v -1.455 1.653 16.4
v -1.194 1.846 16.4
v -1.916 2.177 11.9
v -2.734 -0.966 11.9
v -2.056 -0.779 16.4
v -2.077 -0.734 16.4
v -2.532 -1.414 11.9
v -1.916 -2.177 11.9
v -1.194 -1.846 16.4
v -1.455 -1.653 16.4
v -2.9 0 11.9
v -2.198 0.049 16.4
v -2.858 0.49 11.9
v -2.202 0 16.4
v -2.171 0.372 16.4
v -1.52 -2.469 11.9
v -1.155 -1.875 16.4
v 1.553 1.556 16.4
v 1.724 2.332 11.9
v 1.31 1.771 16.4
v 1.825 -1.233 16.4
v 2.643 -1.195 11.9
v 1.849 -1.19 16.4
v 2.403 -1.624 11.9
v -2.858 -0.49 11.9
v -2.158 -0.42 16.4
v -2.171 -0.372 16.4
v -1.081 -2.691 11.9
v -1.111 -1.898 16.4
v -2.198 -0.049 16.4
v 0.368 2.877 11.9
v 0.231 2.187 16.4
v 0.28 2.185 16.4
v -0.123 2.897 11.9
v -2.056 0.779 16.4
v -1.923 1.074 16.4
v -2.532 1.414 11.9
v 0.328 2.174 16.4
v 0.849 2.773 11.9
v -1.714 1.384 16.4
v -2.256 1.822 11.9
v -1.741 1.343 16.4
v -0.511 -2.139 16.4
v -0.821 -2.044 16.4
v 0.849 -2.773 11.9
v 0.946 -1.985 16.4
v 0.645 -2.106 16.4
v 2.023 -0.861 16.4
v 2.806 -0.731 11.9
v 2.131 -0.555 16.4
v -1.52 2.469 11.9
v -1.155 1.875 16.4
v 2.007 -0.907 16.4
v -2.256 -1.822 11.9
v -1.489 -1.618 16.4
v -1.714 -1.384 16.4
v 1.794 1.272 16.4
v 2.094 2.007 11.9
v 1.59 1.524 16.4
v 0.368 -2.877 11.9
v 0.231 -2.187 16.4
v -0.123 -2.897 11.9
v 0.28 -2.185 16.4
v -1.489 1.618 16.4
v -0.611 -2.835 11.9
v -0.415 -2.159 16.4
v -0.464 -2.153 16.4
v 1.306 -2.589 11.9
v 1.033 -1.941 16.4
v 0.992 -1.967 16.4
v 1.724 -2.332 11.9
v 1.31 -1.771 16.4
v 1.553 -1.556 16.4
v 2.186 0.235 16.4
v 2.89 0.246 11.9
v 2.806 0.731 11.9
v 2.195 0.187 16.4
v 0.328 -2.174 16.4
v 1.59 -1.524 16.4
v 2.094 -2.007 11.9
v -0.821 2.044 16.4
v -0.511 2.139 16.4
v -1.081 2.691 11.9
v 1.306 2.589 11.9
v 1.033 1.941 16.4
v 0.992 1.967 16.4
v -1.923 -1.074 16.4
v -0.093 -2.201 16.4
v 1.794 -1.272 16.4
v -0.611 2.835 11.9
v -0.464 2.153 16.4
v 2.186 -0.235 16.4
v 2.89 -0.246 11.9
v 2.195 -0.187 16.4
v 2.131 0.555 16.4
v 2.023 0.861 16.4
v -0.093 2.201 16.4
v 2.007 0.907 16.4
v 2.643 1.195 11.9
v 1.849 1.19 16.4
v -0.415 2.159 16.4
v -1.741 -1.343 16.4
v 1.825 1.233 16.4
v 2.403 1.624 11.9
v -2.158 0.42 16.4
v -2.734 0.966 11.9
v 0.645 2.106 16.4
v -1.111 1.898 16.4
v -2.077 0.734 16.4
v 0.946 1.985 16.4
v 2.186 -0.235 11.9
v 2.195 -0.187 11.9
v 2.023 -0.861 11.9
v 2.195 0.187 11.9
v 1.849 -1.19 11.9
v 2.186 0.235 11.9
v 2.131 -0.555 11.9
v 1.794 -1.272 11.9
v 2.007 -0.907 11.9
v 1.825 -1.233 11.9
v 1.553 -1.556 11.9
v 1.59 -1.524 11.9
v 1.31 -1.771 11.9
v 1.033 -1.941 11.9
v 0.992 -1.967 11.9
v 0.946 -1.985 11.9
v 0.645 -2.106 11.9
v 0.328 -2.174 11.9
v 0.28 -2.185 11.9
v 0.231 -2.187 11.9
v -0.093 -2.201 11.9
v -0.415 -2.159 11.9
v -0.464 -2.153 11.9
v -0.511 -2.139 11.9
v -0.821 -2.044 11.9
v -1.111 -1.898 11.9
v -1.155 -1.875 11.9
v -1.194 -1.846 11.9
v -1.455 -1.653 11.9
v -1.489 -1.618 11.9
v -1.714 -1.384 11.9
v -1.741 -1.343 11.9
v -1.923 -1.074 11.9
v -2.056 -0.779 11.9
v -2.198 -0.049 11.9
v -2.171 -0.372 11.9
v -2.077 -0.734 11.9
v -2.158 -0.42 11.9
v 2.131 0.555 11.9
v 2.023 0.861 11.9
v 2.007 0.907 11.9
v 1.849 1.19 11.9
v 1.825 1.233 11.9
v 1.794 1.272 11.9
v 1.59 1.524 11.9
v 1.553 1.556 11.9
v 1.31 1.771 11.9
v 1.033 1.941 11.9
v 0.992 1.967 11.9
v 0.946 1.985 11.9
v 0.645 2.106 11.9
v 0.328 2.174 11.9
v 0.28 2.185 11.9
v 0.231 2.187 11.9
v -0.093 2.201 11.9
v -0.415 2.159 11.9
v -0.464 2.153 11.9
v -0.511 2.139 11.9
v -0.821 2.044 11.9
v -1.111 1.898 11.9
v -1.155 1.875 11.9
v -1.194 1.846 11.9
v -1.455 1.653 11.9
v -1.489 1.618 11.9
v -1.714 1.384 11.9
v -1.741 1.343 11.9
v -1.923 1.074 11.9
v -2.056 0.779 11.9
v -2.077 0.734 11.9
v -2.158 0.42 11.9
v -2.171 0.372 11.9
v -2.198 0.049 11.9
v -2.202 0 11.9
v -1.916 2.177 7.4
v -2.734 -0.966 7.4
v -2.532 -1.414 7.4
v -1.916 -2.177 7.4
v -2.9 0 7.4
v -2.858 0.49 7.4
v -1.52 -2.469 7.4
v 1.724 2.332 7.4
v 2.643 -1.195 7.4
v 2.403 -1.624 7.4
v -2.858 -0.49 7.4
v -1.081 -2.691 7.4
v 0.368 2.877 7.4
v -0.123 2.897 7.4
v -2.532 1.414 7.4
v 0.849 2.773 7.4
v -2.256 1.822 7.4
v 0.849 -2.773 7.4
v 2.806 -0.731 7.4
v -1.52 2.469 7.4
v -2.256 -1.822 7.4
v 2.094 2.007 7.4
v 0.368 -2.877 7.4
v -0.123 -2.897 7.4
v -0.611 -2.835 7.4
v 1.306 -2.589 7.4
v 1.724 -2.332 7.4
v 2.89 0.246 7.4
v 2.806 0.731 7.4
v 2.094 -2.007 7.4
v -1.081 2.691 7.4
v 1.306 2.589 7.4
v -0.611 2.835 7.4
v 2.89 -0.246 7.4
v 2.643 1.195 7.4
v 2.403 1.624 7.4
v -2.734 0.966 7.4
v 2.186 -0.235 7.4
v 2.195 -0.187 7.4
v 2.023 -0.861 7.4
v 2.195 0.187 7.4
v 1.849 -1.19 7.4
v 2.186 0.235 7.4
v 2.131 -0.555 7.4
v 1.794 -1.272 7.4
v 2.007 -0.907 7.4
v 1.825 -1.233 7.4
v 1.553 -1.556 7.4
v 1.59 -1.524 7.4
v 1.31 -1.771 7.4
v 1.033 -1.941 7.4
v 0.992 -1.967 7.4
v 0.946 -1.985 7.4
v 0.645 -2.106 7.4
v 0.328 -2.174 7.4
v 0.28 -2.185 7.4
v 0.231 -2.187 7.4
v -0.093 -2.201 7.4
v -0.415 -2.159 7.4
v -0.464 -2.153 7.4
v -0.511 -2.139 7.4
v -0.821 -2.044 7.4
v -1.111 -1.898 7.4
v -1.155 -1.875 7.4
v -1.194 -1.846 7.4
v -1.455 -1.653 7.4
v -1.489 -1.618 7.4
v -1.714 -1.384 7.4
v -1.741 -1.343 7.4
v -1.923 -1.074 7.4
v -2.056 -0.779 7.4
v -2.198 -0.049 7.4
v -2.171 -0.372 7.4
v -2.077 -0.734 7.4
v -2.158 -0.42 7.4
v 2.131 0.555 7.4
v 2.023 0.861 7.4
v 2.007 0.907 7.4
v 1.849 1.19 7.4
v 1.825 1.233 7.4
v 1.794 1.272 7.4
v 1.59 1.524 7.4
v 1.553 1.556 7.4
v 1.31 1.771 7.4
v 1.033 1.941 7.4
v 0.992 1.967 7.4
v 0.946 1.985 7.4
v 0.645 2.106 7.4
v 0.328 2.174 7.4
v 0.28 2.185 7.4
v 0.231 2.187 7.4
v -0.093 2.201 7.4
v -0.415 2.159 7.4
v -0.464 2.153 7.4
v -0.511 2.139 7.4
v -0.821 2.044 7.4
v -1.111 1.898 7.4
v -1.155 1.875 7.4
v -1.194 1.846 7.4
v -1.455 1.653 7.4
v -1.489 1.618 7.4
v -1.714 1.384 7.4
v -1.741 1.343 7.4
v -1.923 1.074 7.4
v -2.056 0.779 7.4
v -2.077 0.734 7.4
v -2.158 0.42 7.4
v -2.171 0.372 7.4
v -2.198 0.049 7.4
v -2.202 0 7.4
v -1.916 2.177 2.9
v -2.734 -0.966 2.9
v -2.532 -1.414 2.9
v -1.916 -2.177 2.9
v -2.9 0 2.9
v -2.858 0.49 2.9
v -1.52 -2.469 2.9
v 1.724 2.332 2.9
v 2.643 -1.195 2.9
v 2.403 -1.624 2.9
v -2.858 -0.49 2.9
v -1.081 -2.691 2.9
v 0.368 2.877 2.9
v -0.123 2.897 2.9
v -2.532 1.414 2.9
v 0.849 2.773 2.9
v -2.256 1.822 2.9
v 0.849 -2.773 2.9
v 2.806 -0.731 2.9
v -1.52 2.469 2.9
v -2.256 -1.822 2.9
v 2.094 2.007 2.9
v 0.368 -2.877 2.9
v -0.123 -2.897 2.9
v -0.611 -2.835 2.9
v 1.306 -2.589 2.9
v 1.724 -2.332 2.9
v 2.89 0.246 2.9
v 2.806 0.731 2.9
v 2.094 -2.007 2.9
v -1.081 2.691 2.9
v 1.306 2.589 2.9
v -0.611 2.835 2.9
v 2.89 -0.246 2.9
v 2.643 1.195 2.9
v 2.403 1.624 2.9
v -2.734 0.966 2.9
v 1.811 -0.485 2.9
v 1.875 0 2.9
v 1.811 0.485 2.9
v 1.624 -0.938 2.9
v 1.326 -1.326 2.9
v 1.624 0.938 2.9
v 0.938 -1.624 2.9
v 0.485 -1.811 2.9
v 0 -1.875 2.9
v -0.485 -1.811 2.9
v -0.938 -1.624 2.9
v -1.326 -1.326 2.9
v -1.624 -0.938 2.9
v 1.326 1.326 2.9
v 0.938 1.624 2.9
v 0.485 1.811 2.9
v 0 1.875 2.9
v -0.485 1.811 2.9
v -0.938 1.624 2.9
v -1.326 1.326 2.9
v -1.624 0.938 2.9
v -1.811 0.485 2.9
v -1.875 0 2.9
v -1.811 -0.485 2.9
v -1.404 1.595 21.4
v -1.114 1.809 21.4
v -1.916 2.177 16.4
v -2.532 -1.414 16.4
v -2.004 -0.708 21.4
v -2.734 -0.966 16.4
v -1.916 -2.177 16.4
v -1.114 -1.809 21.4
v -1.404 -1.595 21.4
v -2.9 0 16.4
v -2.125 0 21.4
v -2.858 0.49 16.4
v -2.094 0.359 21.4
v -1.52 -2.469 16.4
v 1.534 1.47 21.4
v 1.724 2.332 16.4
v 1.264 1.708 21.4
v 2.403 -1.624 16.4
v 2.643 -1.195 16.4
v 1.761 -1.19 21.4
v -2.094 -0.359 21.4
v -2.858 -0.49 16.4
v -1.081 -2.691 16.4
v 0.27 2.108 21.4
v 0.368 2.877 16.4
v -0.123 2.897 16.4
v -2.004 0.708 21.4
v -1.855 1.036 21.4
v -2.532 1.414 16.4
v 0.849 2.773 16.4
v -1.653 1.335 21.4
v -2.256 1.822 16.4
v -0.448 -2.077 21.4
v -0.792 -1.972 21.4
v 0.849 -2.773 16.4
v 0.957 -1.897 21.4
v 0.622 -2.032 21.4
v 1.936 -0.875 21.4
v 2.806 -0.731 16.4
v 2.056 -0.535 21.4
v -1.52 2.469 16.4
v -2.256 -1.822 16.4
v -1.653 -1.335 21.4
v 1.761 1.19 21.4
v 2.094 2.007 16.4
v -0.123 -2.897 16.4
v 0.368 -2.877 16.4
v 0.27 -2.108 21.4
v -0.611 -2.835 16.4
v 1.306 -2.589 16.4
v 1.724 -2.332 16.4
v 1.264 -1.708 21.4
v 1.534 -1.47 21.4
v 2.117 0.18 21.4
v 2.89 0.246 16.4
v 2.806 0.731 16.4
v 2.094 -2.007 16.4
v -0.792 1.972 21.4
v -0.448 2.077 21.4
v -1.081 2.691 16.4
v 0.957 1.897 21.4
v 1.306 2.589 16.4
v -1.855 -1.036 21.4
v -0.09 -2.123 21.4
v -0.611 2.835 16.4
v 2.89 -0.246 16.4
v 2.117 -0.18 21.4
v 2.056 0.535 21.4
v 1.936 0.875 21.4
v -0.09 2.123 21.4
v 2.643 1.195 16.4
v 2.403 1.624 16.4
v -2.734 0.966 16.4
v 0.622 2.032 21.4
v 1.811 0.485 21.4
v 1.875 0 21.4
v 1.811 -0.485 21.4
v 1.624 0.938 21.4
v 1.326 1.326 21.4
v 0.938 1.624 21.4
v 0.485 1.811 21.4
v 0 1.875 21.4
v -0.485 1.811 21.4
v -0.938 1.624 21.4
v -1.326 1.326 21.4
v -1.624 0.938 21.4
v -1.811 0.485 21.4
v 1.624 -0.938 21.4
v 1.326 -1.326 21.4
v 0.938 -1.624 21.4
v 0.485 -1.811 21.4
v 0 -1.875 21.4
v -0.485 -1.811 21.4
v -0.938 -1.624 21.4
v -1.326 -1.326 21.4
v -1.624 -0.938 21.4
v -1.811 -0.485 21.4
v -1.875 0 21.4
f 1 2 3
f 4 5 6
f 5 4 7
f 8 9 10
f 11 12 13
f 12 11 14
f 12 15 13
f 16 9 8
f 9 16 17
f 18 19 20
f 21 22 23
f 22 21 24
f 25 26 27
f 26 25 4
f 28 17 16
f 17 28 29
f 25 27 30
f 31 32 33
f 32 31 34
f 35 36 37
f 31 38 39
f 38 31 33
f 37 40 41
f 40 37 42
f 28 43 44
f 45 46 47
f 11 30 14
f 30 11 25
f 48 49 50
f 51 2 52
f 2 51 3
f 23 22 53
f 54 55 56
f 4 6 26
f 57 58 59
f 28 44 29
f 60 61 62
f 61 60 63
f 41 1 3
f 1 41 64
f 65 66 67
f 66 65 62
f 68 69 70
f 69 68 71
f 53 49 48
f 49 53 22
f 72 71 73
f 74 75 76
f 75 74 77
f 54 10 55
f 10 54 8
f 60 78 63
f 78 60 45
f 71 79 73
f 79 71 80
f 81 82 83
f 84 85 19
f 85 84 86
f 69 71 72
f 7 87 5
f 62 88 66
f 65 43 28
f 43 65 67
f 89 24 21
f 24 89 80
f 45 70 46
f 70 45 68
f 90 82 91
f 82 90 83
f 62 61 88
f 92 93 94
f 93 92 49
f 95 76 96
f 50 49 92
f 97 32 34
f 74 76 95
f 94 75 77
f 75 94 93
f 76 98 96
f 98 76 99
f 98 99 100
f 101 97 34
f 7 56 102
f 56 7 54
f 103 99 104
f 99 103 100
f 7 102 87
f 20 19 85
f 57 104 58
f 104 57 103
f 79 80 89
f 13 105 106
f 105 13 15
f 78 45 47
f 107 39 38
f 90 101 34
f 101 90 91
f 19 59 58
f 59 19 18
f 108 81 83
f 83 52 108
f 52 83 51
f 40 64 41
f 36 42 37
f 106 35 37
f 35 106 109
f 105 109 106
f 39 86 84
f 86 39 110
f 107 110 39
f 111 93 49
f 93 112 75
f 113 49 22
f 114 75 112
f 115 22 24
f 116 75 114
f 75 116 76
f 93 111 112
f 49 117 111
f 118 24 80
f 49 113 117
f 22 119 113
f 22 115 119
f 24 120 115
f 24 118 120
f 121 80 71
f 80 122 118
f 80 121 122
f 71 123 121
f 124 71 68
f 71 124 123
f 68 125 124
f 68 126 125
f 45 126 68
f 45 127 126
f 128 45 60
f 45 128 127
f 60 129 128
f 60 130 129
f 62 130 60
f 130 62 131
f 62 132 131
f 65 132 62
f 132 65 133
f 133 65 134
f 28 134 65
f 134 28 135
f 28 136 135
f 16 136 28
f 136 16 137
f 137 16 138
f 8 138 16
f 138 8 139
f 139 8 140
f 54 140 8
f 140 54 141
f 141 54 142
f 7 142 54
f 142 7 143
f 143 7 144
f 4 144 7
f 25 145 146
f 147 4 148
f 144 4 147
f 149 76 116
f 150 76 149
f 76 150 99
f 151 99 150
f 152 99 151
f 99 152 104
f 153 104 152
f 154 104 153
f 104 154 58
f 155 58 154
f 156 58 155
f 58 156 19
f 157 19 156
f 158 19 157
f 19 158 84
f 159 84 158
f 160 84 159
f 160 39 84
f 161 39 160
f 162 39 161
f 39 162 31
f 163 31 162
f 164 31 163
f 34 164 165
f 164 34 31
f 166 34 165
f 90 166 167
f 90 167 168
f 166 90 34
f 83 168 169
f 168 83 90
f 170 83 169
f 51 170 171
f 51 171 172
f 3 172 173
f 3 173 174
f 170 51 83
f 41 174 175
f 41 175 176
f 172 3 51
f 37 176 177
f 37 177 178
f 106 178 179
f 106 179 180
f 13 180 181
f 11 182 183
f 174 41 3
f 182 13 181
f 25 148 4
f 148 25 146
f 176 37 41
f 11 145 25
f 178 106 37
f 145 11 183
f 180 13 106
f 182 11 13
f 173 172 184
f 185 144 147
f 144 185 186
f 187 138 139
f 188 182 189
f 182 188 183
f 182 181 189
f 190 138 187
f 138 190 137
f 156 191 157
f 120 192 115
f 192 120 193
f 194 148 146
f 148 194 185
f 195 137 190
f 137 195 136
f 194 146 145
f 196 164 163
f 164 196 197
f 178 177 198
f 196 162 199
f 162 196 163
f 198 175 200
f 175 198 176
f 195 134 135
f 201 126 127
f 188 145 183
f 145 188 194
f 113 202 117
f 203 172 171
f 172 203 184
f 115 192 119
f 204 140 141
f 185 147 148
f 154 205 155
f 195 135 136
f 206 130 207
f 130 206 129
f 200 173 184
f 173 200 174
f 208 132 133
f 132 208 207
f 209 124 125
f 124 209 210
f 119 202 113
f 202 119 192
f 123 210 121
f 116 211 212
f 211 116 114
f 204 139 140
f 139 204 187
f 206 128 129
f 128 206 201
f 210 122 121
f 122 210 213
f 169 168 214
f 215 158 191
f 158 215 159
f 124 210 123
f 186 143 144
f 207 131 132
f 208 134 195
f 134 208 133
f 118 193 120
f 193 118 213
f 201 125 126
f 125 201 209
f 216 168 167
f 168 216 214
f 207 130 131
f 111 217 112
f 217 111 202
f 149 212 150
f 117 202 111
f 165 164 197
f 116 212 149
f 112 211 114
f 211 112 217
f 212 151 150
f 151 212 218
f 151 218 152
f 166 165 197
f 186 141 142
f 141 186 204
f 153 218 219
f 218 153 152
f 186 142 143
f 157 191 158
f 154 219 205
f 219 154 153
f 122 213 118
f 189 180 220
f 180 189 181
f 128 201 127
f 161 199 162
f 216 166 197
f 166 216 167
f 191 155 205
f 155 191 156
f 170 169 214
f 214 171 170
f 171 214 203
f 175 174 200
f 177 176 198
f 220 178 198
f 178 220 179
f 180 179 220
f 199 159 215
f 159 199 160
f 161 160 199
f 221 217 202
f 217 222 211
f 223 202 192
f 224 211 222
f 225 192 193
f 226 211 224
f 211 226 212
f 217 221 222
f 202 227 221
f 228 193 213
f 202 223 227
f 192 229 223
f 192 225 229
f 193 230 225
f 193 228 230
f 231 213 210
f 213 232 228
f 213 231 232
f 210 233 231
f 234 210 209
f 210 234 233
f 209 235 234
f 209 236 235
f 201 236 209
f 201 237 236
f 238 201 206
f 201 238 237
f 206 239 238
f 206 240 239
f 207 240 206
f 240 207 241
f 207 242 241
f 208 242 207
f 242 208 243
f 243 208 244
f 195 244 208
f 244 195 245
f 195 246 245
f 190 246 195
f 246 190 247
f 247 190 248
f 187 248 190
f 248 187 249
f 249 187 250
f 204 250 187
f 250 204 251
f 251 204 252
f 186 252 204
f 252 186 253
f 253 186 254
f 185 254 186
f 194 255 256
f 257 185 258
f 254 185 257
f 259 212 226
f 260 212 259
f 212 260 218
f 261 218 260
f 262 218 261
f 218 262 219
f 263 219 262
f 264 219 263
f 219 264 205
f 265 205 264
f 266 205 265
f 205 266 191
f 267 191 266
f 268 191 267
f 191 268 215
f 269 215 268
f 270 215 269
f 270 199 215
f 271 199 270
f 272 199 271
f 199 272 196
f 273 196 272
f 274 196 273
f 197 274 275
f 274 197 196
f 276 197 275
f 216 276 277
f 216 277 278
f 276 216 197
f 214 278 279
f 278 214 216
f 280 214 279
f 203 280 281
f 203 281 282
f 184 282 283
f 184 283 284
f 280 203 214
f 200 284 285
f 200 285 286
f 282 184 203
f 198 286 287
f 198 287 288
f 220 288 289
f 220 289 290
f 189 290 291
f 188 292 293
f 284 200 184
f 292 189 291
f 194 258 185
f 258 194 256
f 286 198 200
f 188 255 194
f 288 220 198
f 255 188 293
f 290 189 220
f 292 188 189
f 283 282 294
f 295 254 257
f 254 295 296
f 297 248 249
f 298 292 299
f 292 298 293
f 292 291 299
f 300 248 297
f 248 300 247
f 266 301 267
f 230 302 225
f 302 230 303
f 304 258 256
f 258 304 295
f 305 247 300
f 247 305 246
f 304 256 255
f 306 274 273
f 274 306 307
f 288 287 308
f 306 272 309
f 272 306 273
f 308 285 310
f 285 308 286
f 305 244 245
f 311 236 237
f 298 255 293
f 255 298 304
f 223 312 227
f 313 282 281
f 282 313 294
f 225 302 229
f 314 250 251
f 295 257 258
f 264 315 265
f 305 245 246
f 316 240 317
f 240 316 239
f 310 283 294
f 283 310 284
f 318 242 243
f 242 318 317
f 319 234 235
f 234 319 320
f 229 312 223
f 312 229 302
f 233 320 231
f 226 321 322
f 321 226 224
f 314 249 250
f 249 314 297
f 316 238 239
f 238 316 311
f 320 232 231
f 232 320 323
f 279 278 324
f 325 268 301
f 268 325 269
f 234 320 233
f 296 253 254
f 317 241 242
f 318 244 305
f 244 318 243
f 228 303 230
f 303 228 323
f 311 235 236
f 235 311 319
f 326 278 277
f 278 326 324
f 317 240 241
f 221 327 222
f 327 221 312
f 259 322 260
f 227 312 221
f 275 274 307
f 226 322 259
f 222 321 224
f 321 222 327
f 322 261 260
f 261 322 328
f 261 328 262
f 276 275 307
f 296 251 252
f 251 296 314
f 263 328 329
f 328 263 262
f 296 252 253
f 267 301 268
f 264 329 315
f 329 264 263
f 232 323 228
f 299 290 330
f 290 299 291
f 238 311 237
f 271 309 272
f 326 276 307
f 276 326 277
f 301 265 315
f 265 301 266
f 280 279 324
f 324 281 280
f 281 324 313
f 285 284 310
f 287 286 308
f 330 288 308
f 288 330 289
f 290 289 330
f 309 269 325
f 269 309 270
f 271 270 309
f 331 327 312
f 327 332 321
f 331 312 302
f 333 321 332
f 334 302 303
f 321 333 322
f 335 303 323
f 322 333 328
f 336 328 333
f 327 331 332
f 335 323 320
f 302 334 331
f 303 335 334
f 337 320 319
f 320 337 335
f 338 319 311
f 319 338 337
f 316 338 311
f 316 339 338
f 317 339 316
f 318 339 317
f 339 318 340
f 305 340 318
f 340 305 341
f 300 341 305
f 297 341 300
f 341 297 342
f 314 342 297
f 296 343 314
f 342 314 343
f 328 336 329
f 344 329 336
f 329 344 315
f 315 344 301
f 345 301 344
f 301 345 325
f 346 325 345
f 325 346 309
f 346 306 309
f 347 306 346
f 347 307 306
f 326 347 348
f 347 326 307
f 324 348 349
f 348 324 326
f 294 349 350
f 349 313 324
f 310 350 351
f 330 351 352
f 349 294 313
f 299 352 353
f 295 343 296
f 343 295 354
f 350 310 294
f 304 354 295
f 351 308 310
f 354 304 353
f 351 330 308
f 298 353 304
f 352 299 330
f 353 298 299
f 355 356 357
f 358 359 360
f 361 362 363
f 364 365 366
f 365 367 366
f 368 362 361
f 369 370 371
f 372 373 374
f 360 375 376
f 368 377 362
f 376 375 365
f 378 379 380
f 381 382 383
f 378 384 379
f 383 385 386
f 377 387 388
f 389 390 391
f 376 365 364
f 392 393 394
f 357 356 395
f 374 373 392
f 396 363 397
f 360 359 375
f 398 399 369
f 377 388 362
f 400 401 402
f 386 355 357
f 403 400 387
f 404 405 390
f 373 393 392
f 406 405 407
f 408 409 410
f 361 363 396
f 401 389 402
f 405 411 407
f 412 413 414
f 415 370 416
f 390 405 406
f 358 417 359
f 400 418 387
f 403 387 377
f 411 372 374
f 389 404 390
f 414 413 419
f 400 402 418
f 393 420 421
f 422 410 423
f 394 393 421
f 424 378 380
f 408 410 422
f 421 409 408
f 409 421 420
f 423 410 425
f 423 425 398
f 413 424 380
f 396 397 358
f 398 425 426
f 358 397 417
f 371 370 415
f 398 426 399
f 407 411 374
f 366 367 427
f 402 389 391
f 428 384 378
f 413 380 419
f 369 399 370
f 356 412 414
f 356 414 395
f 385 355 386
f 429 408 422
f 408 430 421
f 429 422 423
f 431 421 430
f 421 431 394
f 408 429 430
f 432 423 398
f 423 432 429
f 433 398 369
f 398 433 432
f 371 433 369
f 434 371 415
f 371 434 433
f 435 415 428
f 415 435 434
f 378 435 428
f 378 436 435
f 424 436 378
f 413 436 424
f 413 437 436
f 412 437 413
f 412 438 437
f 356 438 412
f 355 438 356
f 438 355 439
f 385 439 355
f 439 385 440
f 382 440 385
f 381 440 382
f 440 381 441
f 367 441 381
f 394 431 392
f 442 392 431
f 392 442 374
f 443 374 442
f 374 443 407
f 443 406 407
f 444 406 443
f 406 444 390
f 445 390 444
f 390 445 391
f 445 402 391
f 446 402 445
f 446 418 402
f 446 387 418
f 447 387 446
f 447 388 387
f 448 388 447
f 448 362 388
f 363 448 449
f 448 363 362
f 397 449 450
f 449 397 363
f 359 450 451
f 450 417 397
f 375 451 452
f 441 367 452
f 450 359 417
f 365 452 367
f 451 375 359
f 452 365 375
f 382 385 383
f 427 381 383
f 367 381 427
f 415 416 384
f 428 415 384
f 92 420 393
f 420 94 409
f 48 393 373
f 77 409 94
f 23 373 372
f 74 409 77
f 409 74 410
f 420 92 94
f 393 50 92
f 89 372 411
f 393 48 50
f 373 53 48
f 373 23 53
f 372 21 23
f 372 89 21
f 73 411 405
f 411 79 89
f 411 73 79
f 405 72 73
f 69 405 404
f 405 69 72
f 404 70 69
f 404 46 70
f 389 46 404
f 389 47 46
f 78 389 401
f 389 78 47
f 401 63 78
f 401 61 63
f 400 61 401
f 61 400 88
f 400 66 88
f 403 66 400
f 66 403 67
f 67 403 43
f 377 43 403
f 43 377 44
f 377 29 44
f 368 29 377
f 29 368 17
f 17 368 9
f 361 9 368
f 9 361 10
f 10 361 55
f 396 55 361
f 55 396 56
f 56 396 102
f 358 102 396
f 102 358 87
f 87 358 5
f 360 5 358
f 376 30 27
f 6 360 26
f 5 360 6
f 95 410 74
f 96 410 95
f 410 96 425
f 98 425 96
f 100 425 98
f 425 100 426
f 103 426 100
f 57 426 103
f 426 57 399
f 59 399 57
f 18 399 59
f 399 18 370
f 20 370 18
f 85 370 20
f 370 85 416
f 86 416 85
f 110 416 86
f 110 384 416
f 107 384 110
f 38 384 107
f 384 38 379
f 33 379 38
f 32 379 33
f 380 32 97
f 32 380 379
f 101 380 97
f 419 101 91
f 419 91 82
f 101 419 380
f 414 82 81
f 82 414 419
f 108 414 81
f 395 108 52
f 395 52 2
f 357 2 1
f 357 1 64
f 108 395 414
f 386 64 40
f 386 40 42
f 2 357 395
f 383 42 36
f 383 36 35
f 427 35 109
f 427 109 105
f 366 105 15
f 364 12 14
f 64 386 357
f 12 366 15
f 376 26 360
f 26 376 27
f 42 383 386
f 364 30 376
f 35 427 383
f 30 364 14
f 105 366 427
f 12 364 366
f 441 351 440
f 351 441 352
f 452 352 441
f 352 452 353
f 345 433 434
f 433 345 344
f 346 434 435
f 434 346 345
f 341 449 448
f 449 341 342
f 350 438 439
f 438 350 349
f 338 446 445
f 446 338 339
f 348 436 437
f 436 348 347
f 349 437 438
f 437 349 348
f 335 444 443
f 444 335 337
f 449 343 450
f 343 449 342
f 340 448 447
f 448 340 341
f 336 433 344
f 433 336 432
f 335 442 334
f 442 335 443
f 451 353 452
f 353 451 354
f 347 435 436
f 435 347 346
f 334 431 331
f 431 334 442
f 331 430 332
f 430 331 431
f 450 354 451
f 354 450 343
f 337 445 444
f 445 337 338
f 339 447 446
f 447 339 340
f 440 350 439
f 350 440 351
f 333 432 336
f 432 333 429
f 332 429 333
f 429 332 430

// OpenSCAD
// Number of hose inputs - which is input and which is output doesn't matter but the input will be on the bottom of the print so should be the larger of the two
inputs = 1;
// Number of hose outputs
outputs = 1;
//  Measurement system for inputs - US in inches, Metric in mm
input_units = "US"; // [US,Metric]
// Measurement system for outputs
output_units = "US"; // [US,Metric]
// Input tubing inside diameter, e.g. 0.5 for 1/2 inch (US); 0.625 for 5/8, 0.75 for 3/4, etc
input_size = 0.625;
// Output tubing inside diameter, e.g. 0.17 for 1/4 inch OD (outside diameter) vinyl tubing (US); 0.25 for 1/4 inch ID (inside diameter) (US); 0.375 for 3/8 inch ID
output_size = 0.375;
// Connector type - Use inline for a single input and single output
connector_type = "inline"; // [inline,vault]
// Inline junction type - currently only round is supported
inline_junction_type = "round"; // [round,hex,none]


/* [Manifold] */

// Vault wall thickness in mm - increase for higher pressure connections
vault_wall_thickness = 2.0;
// Add support under vault for printing
vault_support = "yes"; // [yes,no]
// Ratio of connector diameter to space allocated in vault - increase to allow more space for hose clamps, etc.
vault_connector_ratio = 1.8;

/* [Advanced] */

// Width of junction as ratio of tubing I.D.
inline_junction_width = 0.8;
// Strength factor - use more than 1 for thicker walls to handle higher pressure and stronger clamping
strength = 1.0;
// Number of barbs on input - use 3 for larger tubing to reduce overall print height
input_barb_count = 3;
// Number of barbs on output - use 4 for smaller tubing
output_barb_count = 4;

/* [Hidden] */
inches_to_mm = 25.400;

//make_adapter( input_units == "US" ? input_size * inches_to_mm : input_size, output_units == "US" ? output_size * inches_to_mm : output_size );

module make_adapter( input_diameter, output_diameter )
{

if (connector_type == "inline" && inputs == 1 && outputs == 1)
{
  assign ( junction_height = input_barb_count )
  {
    union() {
      input_barb( input_diameter );
      junction( input_diameter, output_diameter, junction_height );
      output_barb( input_diameter, output_diameter, junction_height );
    }
  }
}
if (connector_type == "vault" || inputs > 1 || outputs > 1)
{
  assign( center_width = max(inputs * input_diameter * vault_connector_ratio, outputs * output_diameter * vault_connector_ratio), center_height = max(input_diameter * vault_connector_ratio, output_diameter * vault_connector_ratio), junction_height = input_barb_count )
  {
   assign( center_empty_input = center_width - input_diameter * vault_connector_ratio * inputs, center_empty_output = center_width - output_diameter * vault_connector_ratio * outputs )
   {
     union() {
       //input_barb( input_diameter );
       for (i = [1:inputs]) 
	    {
		   translate( [center_empty_input / 2 + input_diameter * vault_connector_ratio / 2 + input_diameter * (i-1) * vault_connector_ratio,0,0] ) input_barb( input_diameter );
	    }
		 //echo( "inputs=", inputs, "; input_diameter=", input_diameter, "; outputs=", outputs, "; output_diameter=", output_diameter );
		 //echo( "center_width=", center_width, "; by input=", inputs * input_diameter * vault_connector_ratio, "; by output=", outputs * output_diameter * vault_connector_ratio, "; center_empty_input=", center_empty_input, "; center_empty_output=", center_empty_output );
		 difference()
		 {
			translate([-vault_wall_thickness,-vault_wall_thickness,0]) vault( input_diameter, junction_height, center_width, center_height, center_height, vault_wall_thickness );
			for (i = [1:inputs]) 
			{
				// Make holes in the vault for input entry
      		translate( [center_empty_input / 2 + input_diameter * vault_connector_ratio / 2 + input_diameter * (i-1) * vault_connector_ratio,0,input_diameter * input_barb_count * 0.9 - center_height / 3] ) cylinder( r=input_diameter * 0.36, h=center_height );
			}
			for (i = [1:outputs]) 
			{
				// Make holes in the vault for output egress
      		translate( [center_empty_output / 2 + output_diameter * vault_connector_ratio / 2 + output_diameter * (i-1) * vault_connector_ratio,0,input_diameter * input_barb_count * 0.9 + center_height / 2] ) cylinder( r=output_diameter * 0.36, h=center_height );
			}
		 } // end vault with holes
       //output_barb( input_diameter, output_diameter, 12 );
	    for (i = [1:outputs]) 
		 {
			translate( [center_empty_output / 2 + output_diameter * vault_connector_ratio / 2 + output_diameter * (i-1) * vault_connector_ratio,0,-output_diameter * 0.3] ) output_barb( input_diameter, output_diameter, center_height + 2 * vault_wall_thickness );
		 }
     }
	}
  }
}
}

/****
module tometric( unit_type, value )
{
  if (unit_type == "US") value * 25.4;
  else value;
}
***/

module barbnotch( inside_diameter )
{
  // Generate a single barb notch
  cylinder( h = inside_diameter * 1.0, r1 = inside_diameter * 0.85 / 2, r2 = inside_diameter * 1.16 / 2, $fa = 0.5, $fs = 0.5 );
}

module solidbarbstack( inside_diameter, count )
{
    union() {
      barbnotch( inside_diameter );
		for (i=[2:count]) 
		{
			translate([0,0,(i-1) * inside_diameter * 0.9])
            barbnotch( inside_diameter );
		}
		/***
		if (count > 1) translate([0,0,1 * inside_diameter * 0.9]) barbnotch( inside_diameter );
		if (count > 2) translate([0,0,2 * inside_diameter * 0.9]) barbnotch( inside_diameter );
		***/
    }
}

module barb( inside_diameter, count )
{
  // Generate 4 barbs
  difference() {
    solidbarbstack( inside_diameter, count );
    translate([0,0,-0.3]) cylinder( h = inside_diameter * (count + 1), r = inside_diameter * 0.75 / 2, $fa = 0.5, $fs = 0.5 );
  }
}

module input_barb( input_diameter )
{
  barb( input_diameter, input_barb_count );
}

module output_barb( input_diameter, output_diameter, jheight )
{
  translate( [0,0,input_diameter * input_barb_count * 0.9 + output_diameter * output_barb_count * 0.9 + jheight + 1] ) rotate([0,180,0]) barb( output_diameter, output_barb_count );
}

module junction( input_diameter, output_diameter, jheight )
{
    holeD=input_diameter >= output_diameter ? output_diameter : input_diameter;
  junction_diameter_ratio = (inline_junction_type == "none") ? 1.1 : 1.6;
  translate( [0,0,input_diameter * jheight * 0.9] ) difference() {
	cylinder( r = max(input_diameter, output_diameter) * junction_diameter_ratio / 2, h = 5, $fa = 0.5, $fs = 0.5 );
	cylinder( r1 = input_diameter / 2, r2 = output_diameter / 2, h = (jheight + 1), $fa = 0.5, $fs = 0.5 );
    cylinder(r=holeD/2, h=jheight*2, center=false);
  }
}

module vault( input_diameter, jheight, center_width, center_depth, center_vheight, wall_thickness )
{
  assign( outside_width = center_width + 2 * wall_thickness, outside_depth = center_depth + 2 * wall_thickness, outside_vheight = center_vheight + 2 * wall_thickness, vault_base = input_diameter * jheight * 0.9 )
  {
    translate( [0, -outside_depth / 2 + wall_thickness, vault_base - wall_thickness] ) union()
	 {
	   difference() 
      {
        cube( [outside_width,outside_depth,outside_vheight] );
        translate( [wall_thickness,wall_thickness,wall_thickness] ) cube( [center_width, center_depth, center_vheight] );
      }
	   // Add supports if requested
		if (vault_support == "yes")
	   {
		  assign( support_leg_width = center_width / 4, support_leg_thickness = wall_thickness / 2 )
		  {
		  translate([outside_width-support_leg_width,outside_depth-support_leg_thickness,wall_thickness-vault_base]) cube([support_leg_width, support_leg_thickness, vault_base]);
		  translate([outside_width-support_leg_width,0, wall_thickness-vault_base]) cube([support_leg_width, center_depth + wall_thickness*2, 0.6]);
		  translate([0,outside_depth-support_leg_thickness,wall_thickness-vault_base]) cube([support_leg_width,support_leg_thickness, vault_base]);
		  translate([outside_width-support_leg_width,0,wall_thickness-vault_base]) cube([support_leg_width,support_leg_thickness, vault_base]);
		  translate([0,0, wall_thickness-vault_base]) cube([support_leg_width, center_depth + wall_thickness*2, 0.6]);

		  translate([0,0,wall_thickness-vault_base]) cube([support_leg_width, support_leg_thickness, vault_base]);
		  }
		}
    }
  }
}
od = 5;
id = 3;
x = id + 3 * 0.9;
translate([0,0,-x])
output_barb(id,od,0);
